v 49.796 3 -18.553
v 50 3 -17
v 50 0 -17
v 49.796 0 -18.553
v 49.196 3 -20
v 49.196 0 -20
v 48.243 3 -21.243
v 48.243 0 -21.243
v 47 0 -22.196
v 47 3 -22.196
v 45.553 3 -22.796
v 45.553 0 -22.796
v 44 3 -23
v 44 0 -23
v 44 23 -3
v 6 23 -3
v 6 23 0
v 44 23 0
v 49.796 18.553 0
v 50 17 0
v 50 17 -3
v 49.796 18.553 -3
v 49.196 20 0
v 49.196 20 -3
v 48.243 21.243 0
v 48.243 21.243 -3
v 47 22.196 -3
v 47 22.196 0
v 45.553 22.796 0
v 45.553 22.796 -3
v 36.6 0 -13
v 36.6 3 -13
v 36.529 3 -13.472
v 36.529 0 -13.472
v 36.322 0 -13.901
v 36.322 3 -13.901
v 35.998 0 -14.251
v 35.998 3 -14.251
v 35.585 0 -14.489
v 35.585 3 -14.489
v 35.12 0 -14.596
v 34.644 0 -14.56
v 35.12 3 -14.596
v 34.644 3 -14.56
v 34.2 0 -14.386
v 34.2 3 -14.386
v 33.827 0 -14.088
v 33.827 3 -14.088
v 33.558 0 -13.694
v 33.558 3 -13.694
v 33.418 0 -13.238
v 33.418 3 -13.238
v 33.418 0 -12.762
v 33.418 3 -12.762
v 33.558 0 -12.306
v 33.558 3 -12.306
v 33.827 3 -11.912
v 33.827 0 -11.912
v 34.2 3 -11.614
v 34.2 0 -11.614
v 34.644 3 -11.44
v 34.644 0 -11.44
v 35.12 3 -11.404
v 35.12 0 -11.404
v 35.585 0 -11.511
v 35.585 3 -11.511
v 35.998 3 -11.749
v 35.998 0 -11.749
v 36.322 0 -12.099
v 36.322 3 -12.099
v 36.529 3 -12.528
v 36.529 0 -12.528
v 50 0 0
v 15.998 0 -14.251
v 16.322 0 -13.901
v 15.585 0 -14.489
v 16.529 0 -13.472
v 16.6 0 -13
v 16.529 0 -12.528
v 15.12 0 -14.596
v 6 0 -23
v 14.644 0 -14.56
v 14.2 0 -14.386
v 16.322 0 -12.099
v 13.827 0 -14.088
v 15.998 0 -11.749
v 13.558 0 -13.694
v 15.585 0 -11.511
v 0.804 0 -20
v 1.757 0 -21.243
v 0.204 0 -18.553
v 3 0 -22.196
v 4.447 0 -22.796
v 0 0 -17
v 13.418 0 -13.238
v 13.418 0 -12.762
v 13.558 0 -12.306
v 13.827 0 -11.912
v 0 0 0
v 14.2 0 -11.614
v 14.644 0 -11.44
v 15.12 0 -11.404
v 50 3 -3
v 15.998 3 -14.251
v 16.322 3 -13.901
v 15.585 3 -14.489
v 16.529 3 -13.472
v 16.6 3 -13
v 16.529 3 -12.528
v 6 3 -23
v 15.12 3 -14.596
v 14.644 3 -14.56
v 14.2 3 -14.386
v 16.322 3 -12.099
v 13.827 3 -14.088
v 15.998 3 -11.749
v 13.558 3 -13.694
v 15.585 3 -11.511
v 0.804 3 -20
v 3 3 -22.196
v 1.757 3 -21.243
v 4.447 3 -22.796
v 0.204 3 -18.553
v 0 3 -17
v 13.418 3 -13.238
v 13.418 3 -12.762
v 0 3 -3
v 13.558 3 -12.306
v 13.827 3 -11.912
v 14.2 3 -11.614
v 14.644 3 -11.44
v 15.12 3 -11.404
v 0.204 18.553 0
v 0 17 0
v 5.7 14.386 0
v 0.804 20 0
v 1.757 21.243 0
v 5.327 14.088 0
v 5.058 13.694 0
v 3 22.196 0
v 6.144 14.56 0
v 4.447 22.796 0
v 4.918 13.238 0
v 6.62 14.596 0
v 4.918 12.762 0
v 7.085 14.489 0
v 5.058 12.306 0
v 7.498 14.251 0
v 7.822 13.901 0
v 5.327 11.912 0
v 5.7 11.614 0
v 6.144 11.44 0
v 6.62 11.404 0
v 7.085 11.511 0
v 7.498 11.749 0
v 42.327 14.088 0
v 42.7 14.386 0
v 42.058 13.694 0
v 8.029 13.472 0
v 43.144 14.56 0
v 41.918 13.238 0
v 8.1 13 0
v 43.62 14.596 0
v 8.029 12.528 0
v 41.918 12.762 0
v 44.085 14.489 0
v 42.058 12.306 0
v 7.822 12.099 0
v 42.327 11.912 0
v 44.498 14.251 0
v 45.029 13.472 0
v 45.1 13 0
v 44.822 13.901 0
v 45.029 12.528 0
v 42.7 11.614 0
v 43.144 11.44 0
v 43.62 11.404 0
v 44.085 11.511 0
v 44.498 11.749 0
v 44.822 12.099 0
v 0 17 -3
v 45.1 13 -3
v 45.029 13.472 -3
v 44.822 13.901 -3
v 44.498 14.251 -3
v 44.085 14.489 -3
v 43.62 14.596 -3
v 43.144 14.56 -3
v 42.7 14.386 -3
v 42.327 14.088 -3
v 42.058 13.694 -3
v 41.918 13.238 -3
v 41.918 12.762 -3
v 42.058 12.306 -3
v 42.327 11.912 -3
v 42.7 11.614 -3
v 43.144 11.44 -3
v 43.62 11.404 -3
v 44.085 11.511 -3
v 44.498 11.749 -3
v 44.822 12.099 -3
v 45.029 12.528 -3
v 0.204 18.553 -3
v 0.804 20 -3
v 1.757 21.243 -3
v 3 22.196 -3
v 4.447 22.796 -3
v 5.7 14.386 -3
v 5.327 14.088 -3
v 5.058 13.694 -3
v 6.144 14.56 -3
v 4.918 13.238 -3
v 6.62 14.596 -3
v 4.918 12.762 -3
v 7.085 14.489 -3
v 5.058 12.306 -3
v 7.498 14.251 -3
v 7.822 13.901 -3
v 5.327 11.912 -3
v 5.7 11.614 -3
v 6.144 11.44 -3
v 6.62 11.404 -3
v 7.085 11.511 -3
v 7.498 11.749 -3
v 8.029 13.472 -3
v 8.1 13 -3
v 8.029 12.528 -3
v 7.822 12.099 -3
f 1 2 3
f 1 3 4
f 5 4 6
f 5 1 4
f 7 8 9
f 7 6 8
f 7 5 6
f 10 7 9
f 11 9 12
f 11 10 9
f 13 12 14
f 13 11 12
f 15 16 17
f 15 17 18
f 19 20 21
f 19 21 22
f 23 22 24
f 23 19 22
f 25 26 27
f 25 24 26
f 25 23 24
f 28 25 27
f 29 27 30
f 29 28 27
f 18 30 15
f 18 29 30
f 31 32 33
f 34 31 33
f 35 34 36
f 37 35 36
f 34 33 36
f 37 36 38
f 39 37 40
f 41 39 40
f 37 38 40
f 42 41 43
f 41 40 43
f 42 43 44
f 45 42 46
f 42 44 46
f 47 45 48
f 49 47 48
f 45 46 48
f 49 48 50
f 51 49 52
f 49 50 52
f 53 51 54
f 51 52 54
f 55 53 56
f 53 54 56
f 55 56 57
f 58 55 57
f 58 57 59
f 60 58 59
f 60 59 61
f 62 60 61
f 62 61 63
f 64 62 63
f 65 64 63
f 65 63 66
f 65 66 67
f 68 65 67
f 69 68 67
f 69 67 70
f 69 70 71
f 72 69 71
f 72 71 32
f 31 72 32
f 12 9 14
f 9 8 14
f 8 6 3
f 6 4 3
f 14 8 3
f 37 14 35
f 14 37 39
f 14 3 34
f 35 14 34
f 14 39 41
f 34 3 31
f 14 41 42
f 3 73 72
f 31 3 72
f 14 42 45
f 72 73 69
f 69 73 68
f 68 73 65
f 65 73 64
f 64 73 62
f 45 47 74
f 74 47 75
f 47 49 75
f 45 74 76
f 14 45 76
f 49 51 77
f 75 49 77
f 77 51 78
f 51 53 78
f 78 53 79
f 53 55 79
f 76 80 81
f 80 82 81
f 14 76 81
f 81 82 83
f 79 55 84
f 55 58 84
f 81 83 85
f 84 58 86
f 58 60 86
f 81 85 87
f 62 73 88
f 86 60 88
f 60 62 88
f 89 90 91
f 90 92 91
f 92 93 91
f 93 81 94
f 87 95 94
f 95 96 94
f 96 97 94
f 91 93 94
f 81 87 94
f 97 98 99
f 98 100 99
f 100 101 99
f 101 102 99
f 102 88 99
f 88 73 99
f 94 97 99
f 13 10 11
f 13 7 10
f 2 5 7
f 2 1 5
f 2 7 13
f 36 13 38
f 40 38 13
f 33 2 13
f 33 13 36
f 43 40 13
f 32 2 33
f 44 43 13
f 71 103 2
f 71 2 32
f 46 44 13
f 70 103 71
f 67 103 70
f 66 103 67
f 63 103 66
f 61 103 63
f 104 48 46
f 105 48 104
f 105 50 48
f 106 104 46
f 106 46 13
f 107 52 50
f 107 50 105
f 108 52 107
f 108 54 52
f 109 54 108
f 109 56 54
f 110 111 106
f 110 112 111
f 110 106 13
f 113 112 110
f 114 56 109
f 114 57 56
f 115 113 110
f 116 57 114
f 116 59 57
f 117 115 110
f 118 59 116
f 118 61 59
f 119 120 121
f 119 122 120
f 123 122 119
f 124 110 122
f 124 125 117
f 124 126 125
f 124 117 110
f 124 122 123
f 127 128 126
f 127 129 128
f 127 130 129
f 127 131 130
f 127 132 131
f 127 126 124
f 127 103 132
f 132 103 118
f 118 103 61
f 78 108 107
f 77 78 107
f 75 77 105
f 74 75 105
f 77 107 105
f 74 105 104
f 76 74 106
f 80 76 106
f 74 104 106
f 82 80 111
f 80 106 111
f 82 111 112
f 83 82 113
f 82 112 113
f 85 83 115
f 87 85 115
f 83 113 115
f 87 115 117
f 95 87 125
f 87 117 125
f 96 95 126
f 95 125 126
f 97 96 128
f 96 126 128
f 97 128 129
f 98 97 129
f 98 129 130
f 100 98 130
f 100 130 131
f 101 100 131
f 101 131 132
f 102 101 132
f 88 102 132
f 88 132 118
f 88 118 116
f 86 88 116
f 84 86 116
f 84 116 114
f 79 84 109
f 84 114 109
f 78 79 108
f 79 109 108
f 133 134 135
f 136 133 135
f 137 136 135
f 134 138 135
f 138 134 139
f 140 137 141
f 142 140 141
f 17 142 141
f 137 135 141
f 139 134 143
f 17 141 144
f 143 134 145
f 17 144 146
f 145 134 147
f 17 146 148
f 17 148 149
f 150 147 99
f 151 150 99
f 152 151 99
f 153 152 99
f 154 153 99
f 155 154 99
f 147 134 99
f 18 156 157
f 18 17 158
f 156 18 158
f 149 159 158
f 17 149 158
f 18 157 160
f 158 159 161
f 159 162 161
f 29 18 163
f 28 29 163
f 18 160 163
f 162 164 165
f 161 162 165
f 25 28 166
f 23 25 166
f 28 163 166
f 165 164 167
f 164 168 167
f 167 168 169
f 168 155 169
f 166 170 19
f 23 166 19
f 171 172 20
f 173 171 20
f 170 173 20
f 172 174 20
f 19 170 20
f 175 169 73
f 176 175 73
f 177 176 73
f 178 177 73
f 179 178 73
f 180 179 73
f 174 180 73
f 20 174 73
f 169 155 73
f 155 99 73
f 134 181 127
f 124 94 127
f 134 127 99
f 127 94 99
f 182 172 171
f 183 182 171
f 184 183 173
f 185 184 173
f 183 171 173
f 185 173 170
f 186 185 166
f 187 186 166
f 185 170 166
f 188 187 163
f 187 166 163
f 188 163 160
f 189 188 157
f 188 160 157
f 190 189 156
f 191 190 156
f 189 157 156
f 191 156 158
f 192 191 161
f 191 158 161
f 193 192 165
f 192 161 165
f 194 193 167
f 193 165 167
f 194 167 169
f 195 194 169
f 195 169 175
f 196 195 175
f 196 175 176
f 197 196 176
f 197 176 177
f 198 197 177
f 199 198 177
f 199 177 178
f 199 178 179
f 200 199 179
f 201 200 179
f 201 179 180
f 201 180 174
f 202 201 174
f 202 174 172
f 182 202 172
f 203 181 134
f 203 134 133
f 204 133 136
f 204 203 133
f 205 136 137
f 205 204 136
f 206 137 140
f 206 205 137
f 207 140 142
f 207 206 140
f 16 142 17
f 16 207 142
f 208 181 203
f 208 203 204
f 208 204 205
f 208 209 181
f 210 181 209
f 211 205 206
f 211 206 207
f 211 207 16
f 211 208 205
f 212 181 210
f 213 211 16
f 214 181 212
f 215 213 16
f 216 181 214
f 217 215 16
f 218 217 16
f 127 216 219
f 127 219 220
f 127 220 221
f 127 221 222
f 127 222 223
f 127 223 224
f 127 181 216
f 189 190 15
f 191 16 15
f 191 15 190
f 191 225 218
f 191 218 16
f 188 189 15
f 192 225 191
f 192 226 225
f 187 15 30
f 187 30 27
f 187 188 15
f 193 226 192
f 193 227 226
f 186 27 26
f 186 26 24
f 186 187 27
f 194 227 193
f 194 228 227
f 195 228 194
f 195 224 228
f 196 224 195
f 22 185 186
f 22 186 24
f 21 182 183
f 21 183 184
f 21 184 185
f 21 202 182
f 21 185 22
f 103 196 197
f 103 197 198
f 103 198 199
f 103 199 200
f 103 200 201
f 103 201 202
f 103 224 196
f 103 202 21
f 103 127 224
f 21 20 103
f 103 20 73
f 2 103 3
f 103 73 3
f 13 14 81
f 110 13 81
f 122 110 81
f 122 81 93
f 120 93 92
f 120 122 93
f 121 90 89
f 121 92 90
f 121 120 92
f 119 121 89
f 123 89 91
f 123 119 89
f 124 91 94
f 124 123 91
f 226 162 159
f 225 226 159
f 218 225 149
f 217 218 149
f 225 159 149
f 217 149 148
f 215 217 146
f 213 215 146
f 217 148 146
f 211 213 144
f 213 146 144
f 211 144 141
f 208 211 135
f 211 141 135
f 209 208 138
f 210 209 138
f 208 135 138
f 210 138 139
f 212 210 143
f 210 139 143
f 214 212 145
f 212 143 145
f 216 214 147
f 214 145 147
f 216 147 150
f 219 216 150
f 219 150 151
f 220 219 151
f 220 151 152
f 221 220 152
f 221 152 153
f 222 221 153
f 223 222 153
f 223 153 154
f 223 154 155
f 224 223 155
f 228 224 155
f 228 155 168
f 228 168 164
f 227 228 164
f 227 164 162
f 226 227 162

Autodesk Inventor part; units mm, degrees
ref_plane "YZ Plane" through (0, 0, 0) normal (1, 0, 0) x (0, 1, 0)
ref_plane "XZ Plane" through (0, 0, 0) normal (0, 1, 0) x (-1, 0, 0)
ref_plane "XY Plane" through (0, 0, 0) normal (0, 0, 1) x (1, 0, 0)
sketch "Sketch1" plane through (0, 0, 0) normal (0, 1, 0) x (-1, 0, 0)
  line L0 (0, 0) -> (-50, 0)
  line L1 (-50, 0) -> (-50, -23)
  line L2 (-50, -23) -> (0, -23)
  line L3 (0, -23) -> (0, 0)
  dimension "d0" = 50
  dimension "d1" = 23
extrude "Extrusion1" add sketch "Sketch1" along normal blind 3
sketch "Sketch2" plane through (0, 3, 0) normal (0, 1, 0) x (1, 0, 0)
  line L0 (0, 23) -> (0, 0) construction
  line L1 (0, 0) -> (50, 0) construction
  line L2 (50, 0) -> (50, 23) construction
  line L3 (0, 3) -> (50, 3)
  line L4 (50, 3) -> (50, 0)
  line L5 (50, 0) -> (0, 0)
  line L6 (0, 0) -> (0, 3)
  dimension "d4" = 3
extrude "Extrusion2" add sketch "Sketch2" along normal blind 20
sketch "Sketch3" plane through (0, 0, 0) normal (0, 0, 1) x (1, 0, 0)
  circle A0 centre (6.5, 13) radius 1.6
  circle A1 centre (43.5, 13) radius 1.6
  line L0 (0, 0) -> (0, 23) projected
  line L1 (0, 23) -> (50, 23) projected
  dimension "d7" = 3.2
  dimension "d8" = 3.2
  dimension "d9" = 37
  dimension "d10" = 6.5
  dimension "d11" = 10
  dimension "d12" = 10
extrude "Extrusion3" cut sketch "Sketch3" against normal through all
fillet "Fillet1" radius 6 4 edges at (0, 23, -1.5) (50, 23, -1.5) (0, 1.5, -23) (50, 1.5, -23)
sketch "Sketch4" plane through (0, 3, 0) normal (0, 1, 0) x (1, 0, 0)
  circle A0 centre (35, 13) radius 1.6
  circle A1 centre (15, 13) radius 1.6
  line L0 (44, 23) -> (6, 23) projected
  line L1 (50, 3) -> (50, 17) projected
  point P0 (0, 0)
  point P1 (50, 5)
  dimension "d17" = 3.2
  dimension "d18" = 3.2
  dimension "d19" = 10
  dimension "d20" = 20
  dimension "d21" = 15
extrude "Extrusion4" cut sketch "Sketch4" against normal through all
equation "\"d8\" = d7"
equation "\"d12\" = d11"
properties part number "FrontIRHolder"
